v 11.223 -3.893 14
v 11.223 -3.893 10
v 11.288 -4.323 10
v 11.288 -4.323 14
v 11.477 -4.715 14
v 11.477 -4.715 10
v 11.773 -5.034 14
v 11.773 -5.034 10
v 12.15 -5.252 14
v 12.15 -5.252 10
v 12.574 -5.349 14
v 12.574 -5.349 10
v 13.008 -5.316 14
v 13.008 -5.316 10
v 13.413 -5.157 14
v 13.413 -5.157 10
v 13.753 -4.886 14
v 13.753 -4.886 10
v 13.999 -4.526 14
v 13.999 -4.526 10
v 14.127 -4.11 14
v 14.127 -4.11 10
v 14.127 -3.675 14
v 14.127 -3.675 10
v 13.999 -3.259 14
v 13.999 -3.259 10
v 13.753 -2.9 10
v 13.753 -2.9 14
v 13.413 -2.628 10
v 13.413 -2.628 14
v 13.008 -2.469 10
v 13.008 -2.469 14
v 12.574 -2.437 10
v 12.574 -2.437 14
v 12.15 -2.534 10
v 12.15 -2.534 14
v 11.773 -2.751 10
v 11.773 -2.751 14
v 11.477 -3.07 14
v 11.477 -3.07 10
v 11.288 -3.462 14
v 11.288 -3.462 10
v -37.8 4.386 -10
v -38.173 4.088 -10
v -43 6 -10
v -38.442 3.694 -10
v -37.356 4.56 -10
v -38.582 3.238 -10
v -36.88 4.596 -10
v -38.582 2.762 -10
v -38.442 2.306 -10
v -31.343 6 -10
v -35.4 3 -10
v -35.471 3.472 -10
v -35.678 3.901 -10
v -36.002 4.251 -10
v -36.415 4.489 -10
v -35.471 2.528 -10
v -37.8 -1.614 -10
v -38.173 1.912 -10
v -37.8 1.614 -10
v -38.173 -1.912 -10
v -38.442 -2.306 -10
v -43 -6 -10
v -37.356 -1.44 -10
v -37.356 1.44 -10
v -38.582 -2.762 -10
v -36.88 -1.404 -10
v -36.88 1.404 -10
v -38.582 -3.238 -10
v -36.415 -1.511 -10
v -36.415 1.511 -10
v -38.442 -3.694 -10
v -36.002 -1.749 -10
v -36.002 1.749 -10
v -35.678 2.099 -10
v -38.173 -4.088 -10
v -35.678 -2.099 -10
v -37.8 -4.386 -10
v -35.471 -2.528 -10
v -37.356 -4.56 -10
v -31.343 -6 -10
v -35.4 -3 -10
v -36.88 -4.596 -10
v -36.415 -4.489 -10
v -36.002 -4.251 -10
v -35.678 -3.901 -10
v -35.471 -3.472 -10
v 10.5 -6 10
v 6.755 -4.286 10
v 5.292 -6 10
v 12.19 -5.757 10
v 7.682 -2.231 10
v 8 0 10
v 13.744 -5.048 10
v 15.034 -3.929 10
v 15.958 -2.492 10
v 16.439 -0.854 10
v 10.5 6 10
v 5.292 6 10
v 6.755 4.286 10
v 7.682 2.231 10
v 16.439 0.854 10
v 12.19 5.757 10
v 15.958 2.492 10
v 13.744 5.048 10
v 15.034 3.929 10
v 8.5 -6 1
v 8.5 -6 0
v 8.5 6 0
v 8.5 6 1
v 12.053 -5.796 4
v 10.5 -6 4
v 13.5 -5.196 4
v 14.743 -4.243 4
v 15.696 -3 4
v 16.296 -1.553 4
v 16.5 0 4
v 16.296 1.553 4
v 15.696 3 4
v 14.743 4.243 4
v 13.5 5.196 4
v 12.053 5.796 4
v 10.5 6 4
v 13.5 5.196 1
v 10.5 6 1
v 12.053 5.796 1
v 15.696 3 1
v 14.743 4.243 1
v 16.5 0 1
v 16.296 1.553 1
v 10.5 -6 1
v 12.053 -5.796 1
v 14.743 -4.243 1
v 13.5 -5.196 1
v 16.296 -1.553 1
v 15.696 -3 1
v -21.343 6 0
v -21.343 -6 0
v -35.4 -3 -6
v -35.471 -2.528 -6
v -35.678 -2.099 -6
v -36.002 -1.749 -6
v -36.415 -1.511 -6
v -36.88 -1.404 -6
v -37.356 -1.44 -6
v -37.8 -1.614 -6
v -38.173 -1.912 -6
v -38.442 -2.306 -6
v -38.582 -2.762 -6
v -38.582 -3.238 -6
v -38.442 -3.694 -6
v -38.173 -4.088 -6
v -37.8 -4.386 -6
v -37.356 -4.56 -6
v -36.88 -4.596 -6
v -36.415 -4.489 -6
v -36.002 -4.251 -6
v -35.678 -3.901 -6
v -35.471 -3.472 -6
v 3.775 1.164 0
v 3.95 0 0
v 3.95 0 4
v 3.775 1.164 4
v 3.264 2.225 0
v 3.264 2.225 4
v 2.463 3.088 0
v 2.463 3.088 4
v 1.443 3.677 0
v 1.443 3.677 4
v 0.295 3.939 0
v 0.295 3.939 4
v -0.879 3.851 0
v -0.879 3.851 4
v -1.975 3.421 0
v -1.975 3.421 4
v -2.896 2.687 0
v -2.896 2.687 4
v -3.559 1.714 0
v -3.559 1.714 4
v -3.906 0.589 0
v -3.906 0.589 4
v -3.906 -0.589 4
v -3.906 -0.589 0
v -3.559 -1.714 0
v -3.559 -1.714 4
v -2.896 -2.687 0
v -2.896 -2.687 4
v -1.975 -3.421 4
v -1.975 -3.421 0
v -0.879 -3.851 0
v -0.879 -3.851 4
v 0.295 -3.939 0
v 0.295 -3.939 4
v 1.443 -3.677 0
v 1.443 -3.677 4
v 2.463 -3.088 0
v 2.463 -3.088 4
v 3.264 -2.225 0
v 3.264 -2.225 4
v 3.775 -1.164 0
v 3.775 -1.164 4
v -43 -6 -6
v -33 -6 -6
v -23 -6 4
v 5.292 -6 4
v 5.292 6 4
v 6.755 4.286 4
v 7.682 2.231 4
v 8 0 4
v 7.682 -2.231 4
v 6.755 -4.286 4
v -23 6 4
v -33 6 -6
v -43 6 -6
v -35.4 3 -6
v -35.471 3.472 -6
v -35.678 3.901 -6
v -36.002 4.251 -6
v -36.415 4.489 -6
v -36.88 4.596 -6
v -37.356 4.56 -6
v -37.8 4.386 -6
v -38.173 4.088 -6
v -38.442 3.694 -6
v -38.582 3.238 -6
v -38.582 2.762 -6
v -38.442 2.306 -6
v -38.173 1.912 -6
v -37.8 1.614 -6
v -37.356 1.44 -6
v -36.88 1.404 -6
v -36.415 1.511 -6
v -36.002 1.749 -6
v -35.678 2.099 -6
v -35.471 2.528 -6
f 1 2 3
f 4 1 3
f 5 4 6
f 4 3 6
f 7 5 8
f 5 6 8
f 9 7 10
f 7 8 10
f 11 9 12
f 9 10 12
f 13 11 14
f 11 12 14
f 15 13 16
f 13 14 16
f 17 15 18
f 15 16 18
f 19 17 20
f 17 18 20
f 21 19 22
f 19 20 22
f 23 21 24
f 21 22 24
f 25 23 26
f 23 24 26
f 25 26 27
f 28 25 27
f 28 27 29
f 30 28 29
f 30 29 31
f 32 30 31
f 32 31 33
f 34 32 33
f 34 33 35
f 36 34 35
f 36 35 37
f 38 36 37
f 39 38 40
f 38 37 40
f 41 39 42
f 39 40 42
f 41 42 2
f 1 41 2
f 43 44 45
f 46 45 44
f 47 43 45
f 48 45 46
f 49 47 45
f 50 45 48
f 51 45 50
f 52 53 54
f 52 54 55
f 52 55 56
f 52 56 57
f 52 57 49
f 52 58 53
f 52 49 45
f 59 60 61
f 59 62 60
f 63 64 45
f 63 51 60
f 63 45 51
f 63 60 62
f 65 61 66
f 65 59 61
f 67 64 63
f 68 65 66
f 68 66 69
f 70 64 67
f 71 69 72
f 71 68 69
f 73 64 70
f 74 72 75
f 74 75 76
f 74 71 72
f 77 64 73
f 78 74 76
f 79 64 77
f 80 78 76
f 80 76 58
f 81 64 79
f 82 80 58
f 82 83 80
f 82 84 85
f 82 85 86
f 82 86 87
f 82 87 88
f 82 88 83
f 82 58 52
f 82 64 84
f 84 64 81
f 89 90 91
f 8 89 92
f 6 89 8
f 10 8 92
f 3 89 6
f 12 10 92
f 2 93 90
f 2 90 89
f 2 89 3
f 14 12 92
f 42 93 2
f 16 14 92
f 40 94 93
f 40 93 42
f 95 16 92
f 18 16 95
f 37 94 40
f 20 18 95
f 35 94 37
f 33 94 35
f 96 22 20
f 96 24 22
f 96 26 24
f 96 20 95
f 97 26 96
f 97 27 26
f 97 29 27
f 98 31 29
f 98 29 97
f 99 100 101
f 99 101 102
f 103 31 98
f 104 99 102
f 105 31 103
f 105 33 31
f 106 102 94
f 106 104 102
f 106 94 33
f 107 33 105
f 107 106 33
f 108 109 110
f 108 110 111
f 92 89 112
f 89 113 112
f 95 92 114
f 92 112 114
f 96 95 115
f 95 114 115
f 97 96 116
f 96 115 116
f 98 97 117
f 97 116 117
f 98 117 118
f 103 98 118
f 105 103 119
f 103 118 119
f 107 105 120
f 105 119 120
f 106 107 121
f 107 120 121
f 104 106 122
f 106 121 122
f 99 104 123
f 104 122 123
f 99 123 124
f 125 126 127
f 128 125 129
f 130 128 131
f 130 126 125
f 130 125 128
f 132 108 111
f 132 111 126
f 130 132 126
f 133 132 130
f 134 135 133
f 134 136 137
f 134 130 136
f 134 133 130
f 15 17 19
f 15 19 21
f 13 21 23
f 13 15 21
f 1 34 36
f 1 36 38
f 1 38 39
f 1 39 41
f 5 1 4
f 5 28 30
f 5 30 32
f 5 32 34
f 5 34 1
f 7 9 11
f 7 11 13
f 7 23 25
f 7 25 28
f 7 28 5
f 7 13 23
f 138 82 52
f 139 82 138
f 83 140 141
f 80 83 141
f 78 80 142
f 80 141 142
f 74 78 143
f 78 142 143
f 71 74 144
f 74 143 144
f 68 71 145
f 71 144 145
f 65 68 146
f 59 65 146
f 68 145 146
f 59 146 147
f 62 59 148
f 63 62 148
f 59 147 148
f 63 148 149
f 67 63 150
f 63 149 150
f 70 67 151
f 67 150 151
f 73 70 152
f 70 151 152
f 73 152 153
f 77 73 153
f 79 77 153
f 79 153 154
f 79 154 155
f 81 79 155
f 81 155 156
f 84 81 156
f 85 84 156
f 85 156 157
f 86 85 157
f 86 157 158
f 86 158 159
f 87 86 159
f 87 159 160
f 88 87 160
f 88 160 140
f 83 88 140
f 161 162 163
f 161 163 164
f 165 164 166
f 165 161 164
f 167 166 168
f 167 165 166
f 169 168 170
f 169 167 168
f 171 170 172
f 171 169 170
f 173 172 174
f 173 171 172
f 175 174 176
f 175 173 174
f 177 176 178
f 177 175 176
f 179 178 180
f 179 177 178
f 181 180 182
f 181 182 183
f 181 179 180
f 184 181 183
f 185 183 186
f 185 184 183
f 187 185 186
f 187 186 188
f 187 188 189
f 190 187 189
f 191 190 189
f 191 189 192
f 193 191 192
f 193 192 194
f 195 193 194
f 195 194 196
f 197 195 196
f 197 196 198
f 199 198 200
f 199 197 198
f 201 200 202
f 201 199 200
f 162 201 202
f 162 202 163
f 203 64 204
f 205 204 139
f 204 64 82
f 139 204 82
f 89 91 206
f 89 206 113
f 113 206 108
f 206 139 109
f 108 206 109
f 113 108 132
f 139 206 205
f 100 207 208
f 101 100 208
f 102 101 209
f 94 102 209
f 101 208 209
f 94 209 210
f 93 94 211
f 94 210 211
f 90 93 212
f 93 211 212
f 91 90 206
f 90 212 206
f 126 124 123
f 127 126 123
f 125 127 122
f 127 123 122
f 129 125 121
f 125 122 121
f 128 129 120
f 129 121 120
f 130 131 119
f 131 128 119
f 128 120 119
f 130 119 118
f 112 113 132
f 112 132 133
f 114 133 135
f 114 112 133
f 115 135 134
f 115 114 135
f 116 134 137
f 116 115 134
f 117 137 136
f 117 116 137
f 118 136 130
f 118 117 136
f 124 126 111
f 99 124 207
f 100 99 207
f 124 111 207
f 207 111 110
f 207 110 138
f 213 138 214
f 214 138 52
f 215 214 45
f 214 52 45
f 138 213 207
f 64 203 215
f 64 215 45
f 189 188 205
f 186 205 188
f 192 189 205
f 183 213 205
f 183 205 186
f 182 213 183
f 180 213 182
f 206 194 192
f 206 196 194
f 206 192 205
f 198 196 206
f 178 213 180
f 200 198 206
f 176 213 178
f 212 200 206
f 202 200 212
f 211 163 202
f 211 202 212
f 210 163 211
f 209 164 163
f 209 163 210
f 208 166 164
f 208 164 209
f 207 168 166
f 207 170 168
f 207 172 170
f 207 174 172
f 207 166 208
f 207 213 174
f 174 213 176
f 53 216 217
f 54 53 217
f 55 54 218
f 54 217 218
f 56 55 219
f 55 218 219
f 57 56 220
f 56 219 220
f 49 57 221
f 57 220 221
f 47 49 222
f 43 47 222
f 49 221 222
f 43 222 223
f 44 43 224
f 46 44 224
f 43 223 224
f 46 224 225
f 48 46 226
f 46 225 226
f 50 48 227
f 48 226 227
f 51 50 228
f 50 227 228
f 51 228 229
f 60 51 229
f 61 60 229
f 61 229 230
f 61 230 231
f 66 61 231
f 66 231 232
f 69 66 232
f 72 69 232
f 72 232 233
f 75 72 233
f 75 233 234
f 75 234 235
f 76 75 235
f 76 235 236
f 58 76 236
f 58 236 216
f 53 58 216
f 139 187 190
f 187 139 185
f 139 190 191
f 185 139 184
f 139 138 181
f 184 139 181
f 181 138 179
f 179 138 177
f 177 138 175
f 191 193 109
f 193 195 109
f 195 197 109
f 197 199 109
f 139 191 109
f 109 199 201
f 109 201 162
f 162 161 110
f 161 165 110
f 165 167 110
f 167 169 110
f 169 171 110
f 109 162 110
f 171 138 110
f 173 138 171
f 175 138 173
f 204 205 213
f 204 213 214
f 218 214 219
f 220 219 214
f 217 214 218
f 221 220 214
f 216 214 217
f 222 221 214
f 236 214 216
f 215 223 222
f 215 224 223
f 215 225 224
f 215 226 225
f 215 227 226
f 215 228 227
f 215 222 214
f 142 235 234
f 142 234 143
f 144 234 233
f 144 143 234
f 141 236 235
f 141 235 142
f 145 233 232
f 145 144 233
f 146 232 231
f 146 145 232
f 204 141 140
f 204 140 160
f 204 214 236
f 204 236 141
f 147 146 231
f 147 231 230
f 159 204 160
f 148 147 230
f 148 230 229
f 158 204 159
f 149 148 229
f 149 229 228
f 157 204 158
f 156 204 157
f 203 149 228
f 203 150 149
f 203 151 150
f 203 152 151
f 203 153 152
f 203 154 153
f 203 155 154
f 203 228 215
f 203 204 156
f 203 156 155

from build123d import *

# Parameters (mm, degrees)
SKETCH1_W           = 39.5
SKETCH1_H           = 12
SKETCH1_R           = 3.95
BOSS_EXTRUDE1_DEPTH = 4
BOSS_EXTRUDE3_DEPTH = 12
SKETCH4_R           = 1.6
CUT_EXTRUDE1_DEPTH  = 45.55333882
FILLET1_R           = 6
BOSS_EXTRUDE5_DEPTH = 6
SKETCH5_R           = 1.46
BOSS_EXTRUDE4_DEPTH = 4
SKETCH6_W           = 8
SKETCH6_H           = 1
CUT_EXTRUDE3_DEPTH  = 47.786750261


with BuildPart() as part:
    # Sketch1 → Boss-Extrude1 (new body)
    with BuildSketch(Plane.XY):
        with Locations((-3.25, 0)):
            Rectangle(SKETCH1_W, SKETCH1_H)
        Circle(SKETCH1_R, mode=Mode.SUBTRACT)
    extrude(amount=BOSS_EXTRUDE1_DEPTH)

    # Sketch3 → Boss-Extrude3 (add)
    with BuildSketch(Plane.XZ.offset(6)):
        Polygon((-23, 4), (-33, -6), (-43, -6), (-43, -10), (-31.343145751, -10), (-21.343145751, 0), align=None)
    extrude(amount=-BOSS_EXTRUDE3_DEPTH)

    # Sketch4 → Cut-Extrude1 (cut, through all)
    with BuildSketch(Plane.XY.offset(-6)):
        with Locations((-37, 3)):
            Circle(SKETCH4_R)
        with Locations((-37, -3)):
            Circle(SKETCH4_R)
    extrude(amount=-CUT_EXTRUDE1_DEPTH, mode=Mode.SUBTRACT)

    # Fillet1
    fillet1_edges = [part.edges().sort_by_distance(p)[0] for p in [
        (16.5, 6, 2),
        (16.5, -6, 2),
    ]]
    fillet(fillet1_edges, radius=FILLET1_R - 0.0001)  # a hair under: the kernel refuses the full size

    # Sketch7 → Boss-Extrude5 (add)
    with BuildSketch(Plane.XY.offset(4)):
        with BuildLine():
            Line((5.291502622, -6), (10.5, -6))
            ThreePointArc((10.5, -6), (16.5, 0), (10.5, 6))
            Line((10.5, 6), (5.291502622, 6))
            ThreePointArc((5.291502622, 6), (8, 0), (5.291502622, -6))
        make_face()
    extrude(amount=BOSS_EXTRUDE5_DEPTH)

    # Sketch5 → Boss-Extrude4 (add)
    with BuildSketch(Plane.XY.offset(10)):
        with Locations(Location((12.683177793, -3.892819016, 0), (0, 0, 180))):
            Circle(SKETCH5_R)
    extrude(amount=BOSS_EXTRUDE4_DEPTH)

    # Sketch6 → Cut-Extrude3 (cut, through all)
    with BuildSketch(Plane.XZ.offset(6)):
        with Locations((12.5, 0.5)):
            Rectangle(SKETCH6_W, SKETCH6_H)
    extrude(amount=-CUT_EXTRUDE3_DEPTH, mode=Mode.SUBTRACT)


solid = part.part
